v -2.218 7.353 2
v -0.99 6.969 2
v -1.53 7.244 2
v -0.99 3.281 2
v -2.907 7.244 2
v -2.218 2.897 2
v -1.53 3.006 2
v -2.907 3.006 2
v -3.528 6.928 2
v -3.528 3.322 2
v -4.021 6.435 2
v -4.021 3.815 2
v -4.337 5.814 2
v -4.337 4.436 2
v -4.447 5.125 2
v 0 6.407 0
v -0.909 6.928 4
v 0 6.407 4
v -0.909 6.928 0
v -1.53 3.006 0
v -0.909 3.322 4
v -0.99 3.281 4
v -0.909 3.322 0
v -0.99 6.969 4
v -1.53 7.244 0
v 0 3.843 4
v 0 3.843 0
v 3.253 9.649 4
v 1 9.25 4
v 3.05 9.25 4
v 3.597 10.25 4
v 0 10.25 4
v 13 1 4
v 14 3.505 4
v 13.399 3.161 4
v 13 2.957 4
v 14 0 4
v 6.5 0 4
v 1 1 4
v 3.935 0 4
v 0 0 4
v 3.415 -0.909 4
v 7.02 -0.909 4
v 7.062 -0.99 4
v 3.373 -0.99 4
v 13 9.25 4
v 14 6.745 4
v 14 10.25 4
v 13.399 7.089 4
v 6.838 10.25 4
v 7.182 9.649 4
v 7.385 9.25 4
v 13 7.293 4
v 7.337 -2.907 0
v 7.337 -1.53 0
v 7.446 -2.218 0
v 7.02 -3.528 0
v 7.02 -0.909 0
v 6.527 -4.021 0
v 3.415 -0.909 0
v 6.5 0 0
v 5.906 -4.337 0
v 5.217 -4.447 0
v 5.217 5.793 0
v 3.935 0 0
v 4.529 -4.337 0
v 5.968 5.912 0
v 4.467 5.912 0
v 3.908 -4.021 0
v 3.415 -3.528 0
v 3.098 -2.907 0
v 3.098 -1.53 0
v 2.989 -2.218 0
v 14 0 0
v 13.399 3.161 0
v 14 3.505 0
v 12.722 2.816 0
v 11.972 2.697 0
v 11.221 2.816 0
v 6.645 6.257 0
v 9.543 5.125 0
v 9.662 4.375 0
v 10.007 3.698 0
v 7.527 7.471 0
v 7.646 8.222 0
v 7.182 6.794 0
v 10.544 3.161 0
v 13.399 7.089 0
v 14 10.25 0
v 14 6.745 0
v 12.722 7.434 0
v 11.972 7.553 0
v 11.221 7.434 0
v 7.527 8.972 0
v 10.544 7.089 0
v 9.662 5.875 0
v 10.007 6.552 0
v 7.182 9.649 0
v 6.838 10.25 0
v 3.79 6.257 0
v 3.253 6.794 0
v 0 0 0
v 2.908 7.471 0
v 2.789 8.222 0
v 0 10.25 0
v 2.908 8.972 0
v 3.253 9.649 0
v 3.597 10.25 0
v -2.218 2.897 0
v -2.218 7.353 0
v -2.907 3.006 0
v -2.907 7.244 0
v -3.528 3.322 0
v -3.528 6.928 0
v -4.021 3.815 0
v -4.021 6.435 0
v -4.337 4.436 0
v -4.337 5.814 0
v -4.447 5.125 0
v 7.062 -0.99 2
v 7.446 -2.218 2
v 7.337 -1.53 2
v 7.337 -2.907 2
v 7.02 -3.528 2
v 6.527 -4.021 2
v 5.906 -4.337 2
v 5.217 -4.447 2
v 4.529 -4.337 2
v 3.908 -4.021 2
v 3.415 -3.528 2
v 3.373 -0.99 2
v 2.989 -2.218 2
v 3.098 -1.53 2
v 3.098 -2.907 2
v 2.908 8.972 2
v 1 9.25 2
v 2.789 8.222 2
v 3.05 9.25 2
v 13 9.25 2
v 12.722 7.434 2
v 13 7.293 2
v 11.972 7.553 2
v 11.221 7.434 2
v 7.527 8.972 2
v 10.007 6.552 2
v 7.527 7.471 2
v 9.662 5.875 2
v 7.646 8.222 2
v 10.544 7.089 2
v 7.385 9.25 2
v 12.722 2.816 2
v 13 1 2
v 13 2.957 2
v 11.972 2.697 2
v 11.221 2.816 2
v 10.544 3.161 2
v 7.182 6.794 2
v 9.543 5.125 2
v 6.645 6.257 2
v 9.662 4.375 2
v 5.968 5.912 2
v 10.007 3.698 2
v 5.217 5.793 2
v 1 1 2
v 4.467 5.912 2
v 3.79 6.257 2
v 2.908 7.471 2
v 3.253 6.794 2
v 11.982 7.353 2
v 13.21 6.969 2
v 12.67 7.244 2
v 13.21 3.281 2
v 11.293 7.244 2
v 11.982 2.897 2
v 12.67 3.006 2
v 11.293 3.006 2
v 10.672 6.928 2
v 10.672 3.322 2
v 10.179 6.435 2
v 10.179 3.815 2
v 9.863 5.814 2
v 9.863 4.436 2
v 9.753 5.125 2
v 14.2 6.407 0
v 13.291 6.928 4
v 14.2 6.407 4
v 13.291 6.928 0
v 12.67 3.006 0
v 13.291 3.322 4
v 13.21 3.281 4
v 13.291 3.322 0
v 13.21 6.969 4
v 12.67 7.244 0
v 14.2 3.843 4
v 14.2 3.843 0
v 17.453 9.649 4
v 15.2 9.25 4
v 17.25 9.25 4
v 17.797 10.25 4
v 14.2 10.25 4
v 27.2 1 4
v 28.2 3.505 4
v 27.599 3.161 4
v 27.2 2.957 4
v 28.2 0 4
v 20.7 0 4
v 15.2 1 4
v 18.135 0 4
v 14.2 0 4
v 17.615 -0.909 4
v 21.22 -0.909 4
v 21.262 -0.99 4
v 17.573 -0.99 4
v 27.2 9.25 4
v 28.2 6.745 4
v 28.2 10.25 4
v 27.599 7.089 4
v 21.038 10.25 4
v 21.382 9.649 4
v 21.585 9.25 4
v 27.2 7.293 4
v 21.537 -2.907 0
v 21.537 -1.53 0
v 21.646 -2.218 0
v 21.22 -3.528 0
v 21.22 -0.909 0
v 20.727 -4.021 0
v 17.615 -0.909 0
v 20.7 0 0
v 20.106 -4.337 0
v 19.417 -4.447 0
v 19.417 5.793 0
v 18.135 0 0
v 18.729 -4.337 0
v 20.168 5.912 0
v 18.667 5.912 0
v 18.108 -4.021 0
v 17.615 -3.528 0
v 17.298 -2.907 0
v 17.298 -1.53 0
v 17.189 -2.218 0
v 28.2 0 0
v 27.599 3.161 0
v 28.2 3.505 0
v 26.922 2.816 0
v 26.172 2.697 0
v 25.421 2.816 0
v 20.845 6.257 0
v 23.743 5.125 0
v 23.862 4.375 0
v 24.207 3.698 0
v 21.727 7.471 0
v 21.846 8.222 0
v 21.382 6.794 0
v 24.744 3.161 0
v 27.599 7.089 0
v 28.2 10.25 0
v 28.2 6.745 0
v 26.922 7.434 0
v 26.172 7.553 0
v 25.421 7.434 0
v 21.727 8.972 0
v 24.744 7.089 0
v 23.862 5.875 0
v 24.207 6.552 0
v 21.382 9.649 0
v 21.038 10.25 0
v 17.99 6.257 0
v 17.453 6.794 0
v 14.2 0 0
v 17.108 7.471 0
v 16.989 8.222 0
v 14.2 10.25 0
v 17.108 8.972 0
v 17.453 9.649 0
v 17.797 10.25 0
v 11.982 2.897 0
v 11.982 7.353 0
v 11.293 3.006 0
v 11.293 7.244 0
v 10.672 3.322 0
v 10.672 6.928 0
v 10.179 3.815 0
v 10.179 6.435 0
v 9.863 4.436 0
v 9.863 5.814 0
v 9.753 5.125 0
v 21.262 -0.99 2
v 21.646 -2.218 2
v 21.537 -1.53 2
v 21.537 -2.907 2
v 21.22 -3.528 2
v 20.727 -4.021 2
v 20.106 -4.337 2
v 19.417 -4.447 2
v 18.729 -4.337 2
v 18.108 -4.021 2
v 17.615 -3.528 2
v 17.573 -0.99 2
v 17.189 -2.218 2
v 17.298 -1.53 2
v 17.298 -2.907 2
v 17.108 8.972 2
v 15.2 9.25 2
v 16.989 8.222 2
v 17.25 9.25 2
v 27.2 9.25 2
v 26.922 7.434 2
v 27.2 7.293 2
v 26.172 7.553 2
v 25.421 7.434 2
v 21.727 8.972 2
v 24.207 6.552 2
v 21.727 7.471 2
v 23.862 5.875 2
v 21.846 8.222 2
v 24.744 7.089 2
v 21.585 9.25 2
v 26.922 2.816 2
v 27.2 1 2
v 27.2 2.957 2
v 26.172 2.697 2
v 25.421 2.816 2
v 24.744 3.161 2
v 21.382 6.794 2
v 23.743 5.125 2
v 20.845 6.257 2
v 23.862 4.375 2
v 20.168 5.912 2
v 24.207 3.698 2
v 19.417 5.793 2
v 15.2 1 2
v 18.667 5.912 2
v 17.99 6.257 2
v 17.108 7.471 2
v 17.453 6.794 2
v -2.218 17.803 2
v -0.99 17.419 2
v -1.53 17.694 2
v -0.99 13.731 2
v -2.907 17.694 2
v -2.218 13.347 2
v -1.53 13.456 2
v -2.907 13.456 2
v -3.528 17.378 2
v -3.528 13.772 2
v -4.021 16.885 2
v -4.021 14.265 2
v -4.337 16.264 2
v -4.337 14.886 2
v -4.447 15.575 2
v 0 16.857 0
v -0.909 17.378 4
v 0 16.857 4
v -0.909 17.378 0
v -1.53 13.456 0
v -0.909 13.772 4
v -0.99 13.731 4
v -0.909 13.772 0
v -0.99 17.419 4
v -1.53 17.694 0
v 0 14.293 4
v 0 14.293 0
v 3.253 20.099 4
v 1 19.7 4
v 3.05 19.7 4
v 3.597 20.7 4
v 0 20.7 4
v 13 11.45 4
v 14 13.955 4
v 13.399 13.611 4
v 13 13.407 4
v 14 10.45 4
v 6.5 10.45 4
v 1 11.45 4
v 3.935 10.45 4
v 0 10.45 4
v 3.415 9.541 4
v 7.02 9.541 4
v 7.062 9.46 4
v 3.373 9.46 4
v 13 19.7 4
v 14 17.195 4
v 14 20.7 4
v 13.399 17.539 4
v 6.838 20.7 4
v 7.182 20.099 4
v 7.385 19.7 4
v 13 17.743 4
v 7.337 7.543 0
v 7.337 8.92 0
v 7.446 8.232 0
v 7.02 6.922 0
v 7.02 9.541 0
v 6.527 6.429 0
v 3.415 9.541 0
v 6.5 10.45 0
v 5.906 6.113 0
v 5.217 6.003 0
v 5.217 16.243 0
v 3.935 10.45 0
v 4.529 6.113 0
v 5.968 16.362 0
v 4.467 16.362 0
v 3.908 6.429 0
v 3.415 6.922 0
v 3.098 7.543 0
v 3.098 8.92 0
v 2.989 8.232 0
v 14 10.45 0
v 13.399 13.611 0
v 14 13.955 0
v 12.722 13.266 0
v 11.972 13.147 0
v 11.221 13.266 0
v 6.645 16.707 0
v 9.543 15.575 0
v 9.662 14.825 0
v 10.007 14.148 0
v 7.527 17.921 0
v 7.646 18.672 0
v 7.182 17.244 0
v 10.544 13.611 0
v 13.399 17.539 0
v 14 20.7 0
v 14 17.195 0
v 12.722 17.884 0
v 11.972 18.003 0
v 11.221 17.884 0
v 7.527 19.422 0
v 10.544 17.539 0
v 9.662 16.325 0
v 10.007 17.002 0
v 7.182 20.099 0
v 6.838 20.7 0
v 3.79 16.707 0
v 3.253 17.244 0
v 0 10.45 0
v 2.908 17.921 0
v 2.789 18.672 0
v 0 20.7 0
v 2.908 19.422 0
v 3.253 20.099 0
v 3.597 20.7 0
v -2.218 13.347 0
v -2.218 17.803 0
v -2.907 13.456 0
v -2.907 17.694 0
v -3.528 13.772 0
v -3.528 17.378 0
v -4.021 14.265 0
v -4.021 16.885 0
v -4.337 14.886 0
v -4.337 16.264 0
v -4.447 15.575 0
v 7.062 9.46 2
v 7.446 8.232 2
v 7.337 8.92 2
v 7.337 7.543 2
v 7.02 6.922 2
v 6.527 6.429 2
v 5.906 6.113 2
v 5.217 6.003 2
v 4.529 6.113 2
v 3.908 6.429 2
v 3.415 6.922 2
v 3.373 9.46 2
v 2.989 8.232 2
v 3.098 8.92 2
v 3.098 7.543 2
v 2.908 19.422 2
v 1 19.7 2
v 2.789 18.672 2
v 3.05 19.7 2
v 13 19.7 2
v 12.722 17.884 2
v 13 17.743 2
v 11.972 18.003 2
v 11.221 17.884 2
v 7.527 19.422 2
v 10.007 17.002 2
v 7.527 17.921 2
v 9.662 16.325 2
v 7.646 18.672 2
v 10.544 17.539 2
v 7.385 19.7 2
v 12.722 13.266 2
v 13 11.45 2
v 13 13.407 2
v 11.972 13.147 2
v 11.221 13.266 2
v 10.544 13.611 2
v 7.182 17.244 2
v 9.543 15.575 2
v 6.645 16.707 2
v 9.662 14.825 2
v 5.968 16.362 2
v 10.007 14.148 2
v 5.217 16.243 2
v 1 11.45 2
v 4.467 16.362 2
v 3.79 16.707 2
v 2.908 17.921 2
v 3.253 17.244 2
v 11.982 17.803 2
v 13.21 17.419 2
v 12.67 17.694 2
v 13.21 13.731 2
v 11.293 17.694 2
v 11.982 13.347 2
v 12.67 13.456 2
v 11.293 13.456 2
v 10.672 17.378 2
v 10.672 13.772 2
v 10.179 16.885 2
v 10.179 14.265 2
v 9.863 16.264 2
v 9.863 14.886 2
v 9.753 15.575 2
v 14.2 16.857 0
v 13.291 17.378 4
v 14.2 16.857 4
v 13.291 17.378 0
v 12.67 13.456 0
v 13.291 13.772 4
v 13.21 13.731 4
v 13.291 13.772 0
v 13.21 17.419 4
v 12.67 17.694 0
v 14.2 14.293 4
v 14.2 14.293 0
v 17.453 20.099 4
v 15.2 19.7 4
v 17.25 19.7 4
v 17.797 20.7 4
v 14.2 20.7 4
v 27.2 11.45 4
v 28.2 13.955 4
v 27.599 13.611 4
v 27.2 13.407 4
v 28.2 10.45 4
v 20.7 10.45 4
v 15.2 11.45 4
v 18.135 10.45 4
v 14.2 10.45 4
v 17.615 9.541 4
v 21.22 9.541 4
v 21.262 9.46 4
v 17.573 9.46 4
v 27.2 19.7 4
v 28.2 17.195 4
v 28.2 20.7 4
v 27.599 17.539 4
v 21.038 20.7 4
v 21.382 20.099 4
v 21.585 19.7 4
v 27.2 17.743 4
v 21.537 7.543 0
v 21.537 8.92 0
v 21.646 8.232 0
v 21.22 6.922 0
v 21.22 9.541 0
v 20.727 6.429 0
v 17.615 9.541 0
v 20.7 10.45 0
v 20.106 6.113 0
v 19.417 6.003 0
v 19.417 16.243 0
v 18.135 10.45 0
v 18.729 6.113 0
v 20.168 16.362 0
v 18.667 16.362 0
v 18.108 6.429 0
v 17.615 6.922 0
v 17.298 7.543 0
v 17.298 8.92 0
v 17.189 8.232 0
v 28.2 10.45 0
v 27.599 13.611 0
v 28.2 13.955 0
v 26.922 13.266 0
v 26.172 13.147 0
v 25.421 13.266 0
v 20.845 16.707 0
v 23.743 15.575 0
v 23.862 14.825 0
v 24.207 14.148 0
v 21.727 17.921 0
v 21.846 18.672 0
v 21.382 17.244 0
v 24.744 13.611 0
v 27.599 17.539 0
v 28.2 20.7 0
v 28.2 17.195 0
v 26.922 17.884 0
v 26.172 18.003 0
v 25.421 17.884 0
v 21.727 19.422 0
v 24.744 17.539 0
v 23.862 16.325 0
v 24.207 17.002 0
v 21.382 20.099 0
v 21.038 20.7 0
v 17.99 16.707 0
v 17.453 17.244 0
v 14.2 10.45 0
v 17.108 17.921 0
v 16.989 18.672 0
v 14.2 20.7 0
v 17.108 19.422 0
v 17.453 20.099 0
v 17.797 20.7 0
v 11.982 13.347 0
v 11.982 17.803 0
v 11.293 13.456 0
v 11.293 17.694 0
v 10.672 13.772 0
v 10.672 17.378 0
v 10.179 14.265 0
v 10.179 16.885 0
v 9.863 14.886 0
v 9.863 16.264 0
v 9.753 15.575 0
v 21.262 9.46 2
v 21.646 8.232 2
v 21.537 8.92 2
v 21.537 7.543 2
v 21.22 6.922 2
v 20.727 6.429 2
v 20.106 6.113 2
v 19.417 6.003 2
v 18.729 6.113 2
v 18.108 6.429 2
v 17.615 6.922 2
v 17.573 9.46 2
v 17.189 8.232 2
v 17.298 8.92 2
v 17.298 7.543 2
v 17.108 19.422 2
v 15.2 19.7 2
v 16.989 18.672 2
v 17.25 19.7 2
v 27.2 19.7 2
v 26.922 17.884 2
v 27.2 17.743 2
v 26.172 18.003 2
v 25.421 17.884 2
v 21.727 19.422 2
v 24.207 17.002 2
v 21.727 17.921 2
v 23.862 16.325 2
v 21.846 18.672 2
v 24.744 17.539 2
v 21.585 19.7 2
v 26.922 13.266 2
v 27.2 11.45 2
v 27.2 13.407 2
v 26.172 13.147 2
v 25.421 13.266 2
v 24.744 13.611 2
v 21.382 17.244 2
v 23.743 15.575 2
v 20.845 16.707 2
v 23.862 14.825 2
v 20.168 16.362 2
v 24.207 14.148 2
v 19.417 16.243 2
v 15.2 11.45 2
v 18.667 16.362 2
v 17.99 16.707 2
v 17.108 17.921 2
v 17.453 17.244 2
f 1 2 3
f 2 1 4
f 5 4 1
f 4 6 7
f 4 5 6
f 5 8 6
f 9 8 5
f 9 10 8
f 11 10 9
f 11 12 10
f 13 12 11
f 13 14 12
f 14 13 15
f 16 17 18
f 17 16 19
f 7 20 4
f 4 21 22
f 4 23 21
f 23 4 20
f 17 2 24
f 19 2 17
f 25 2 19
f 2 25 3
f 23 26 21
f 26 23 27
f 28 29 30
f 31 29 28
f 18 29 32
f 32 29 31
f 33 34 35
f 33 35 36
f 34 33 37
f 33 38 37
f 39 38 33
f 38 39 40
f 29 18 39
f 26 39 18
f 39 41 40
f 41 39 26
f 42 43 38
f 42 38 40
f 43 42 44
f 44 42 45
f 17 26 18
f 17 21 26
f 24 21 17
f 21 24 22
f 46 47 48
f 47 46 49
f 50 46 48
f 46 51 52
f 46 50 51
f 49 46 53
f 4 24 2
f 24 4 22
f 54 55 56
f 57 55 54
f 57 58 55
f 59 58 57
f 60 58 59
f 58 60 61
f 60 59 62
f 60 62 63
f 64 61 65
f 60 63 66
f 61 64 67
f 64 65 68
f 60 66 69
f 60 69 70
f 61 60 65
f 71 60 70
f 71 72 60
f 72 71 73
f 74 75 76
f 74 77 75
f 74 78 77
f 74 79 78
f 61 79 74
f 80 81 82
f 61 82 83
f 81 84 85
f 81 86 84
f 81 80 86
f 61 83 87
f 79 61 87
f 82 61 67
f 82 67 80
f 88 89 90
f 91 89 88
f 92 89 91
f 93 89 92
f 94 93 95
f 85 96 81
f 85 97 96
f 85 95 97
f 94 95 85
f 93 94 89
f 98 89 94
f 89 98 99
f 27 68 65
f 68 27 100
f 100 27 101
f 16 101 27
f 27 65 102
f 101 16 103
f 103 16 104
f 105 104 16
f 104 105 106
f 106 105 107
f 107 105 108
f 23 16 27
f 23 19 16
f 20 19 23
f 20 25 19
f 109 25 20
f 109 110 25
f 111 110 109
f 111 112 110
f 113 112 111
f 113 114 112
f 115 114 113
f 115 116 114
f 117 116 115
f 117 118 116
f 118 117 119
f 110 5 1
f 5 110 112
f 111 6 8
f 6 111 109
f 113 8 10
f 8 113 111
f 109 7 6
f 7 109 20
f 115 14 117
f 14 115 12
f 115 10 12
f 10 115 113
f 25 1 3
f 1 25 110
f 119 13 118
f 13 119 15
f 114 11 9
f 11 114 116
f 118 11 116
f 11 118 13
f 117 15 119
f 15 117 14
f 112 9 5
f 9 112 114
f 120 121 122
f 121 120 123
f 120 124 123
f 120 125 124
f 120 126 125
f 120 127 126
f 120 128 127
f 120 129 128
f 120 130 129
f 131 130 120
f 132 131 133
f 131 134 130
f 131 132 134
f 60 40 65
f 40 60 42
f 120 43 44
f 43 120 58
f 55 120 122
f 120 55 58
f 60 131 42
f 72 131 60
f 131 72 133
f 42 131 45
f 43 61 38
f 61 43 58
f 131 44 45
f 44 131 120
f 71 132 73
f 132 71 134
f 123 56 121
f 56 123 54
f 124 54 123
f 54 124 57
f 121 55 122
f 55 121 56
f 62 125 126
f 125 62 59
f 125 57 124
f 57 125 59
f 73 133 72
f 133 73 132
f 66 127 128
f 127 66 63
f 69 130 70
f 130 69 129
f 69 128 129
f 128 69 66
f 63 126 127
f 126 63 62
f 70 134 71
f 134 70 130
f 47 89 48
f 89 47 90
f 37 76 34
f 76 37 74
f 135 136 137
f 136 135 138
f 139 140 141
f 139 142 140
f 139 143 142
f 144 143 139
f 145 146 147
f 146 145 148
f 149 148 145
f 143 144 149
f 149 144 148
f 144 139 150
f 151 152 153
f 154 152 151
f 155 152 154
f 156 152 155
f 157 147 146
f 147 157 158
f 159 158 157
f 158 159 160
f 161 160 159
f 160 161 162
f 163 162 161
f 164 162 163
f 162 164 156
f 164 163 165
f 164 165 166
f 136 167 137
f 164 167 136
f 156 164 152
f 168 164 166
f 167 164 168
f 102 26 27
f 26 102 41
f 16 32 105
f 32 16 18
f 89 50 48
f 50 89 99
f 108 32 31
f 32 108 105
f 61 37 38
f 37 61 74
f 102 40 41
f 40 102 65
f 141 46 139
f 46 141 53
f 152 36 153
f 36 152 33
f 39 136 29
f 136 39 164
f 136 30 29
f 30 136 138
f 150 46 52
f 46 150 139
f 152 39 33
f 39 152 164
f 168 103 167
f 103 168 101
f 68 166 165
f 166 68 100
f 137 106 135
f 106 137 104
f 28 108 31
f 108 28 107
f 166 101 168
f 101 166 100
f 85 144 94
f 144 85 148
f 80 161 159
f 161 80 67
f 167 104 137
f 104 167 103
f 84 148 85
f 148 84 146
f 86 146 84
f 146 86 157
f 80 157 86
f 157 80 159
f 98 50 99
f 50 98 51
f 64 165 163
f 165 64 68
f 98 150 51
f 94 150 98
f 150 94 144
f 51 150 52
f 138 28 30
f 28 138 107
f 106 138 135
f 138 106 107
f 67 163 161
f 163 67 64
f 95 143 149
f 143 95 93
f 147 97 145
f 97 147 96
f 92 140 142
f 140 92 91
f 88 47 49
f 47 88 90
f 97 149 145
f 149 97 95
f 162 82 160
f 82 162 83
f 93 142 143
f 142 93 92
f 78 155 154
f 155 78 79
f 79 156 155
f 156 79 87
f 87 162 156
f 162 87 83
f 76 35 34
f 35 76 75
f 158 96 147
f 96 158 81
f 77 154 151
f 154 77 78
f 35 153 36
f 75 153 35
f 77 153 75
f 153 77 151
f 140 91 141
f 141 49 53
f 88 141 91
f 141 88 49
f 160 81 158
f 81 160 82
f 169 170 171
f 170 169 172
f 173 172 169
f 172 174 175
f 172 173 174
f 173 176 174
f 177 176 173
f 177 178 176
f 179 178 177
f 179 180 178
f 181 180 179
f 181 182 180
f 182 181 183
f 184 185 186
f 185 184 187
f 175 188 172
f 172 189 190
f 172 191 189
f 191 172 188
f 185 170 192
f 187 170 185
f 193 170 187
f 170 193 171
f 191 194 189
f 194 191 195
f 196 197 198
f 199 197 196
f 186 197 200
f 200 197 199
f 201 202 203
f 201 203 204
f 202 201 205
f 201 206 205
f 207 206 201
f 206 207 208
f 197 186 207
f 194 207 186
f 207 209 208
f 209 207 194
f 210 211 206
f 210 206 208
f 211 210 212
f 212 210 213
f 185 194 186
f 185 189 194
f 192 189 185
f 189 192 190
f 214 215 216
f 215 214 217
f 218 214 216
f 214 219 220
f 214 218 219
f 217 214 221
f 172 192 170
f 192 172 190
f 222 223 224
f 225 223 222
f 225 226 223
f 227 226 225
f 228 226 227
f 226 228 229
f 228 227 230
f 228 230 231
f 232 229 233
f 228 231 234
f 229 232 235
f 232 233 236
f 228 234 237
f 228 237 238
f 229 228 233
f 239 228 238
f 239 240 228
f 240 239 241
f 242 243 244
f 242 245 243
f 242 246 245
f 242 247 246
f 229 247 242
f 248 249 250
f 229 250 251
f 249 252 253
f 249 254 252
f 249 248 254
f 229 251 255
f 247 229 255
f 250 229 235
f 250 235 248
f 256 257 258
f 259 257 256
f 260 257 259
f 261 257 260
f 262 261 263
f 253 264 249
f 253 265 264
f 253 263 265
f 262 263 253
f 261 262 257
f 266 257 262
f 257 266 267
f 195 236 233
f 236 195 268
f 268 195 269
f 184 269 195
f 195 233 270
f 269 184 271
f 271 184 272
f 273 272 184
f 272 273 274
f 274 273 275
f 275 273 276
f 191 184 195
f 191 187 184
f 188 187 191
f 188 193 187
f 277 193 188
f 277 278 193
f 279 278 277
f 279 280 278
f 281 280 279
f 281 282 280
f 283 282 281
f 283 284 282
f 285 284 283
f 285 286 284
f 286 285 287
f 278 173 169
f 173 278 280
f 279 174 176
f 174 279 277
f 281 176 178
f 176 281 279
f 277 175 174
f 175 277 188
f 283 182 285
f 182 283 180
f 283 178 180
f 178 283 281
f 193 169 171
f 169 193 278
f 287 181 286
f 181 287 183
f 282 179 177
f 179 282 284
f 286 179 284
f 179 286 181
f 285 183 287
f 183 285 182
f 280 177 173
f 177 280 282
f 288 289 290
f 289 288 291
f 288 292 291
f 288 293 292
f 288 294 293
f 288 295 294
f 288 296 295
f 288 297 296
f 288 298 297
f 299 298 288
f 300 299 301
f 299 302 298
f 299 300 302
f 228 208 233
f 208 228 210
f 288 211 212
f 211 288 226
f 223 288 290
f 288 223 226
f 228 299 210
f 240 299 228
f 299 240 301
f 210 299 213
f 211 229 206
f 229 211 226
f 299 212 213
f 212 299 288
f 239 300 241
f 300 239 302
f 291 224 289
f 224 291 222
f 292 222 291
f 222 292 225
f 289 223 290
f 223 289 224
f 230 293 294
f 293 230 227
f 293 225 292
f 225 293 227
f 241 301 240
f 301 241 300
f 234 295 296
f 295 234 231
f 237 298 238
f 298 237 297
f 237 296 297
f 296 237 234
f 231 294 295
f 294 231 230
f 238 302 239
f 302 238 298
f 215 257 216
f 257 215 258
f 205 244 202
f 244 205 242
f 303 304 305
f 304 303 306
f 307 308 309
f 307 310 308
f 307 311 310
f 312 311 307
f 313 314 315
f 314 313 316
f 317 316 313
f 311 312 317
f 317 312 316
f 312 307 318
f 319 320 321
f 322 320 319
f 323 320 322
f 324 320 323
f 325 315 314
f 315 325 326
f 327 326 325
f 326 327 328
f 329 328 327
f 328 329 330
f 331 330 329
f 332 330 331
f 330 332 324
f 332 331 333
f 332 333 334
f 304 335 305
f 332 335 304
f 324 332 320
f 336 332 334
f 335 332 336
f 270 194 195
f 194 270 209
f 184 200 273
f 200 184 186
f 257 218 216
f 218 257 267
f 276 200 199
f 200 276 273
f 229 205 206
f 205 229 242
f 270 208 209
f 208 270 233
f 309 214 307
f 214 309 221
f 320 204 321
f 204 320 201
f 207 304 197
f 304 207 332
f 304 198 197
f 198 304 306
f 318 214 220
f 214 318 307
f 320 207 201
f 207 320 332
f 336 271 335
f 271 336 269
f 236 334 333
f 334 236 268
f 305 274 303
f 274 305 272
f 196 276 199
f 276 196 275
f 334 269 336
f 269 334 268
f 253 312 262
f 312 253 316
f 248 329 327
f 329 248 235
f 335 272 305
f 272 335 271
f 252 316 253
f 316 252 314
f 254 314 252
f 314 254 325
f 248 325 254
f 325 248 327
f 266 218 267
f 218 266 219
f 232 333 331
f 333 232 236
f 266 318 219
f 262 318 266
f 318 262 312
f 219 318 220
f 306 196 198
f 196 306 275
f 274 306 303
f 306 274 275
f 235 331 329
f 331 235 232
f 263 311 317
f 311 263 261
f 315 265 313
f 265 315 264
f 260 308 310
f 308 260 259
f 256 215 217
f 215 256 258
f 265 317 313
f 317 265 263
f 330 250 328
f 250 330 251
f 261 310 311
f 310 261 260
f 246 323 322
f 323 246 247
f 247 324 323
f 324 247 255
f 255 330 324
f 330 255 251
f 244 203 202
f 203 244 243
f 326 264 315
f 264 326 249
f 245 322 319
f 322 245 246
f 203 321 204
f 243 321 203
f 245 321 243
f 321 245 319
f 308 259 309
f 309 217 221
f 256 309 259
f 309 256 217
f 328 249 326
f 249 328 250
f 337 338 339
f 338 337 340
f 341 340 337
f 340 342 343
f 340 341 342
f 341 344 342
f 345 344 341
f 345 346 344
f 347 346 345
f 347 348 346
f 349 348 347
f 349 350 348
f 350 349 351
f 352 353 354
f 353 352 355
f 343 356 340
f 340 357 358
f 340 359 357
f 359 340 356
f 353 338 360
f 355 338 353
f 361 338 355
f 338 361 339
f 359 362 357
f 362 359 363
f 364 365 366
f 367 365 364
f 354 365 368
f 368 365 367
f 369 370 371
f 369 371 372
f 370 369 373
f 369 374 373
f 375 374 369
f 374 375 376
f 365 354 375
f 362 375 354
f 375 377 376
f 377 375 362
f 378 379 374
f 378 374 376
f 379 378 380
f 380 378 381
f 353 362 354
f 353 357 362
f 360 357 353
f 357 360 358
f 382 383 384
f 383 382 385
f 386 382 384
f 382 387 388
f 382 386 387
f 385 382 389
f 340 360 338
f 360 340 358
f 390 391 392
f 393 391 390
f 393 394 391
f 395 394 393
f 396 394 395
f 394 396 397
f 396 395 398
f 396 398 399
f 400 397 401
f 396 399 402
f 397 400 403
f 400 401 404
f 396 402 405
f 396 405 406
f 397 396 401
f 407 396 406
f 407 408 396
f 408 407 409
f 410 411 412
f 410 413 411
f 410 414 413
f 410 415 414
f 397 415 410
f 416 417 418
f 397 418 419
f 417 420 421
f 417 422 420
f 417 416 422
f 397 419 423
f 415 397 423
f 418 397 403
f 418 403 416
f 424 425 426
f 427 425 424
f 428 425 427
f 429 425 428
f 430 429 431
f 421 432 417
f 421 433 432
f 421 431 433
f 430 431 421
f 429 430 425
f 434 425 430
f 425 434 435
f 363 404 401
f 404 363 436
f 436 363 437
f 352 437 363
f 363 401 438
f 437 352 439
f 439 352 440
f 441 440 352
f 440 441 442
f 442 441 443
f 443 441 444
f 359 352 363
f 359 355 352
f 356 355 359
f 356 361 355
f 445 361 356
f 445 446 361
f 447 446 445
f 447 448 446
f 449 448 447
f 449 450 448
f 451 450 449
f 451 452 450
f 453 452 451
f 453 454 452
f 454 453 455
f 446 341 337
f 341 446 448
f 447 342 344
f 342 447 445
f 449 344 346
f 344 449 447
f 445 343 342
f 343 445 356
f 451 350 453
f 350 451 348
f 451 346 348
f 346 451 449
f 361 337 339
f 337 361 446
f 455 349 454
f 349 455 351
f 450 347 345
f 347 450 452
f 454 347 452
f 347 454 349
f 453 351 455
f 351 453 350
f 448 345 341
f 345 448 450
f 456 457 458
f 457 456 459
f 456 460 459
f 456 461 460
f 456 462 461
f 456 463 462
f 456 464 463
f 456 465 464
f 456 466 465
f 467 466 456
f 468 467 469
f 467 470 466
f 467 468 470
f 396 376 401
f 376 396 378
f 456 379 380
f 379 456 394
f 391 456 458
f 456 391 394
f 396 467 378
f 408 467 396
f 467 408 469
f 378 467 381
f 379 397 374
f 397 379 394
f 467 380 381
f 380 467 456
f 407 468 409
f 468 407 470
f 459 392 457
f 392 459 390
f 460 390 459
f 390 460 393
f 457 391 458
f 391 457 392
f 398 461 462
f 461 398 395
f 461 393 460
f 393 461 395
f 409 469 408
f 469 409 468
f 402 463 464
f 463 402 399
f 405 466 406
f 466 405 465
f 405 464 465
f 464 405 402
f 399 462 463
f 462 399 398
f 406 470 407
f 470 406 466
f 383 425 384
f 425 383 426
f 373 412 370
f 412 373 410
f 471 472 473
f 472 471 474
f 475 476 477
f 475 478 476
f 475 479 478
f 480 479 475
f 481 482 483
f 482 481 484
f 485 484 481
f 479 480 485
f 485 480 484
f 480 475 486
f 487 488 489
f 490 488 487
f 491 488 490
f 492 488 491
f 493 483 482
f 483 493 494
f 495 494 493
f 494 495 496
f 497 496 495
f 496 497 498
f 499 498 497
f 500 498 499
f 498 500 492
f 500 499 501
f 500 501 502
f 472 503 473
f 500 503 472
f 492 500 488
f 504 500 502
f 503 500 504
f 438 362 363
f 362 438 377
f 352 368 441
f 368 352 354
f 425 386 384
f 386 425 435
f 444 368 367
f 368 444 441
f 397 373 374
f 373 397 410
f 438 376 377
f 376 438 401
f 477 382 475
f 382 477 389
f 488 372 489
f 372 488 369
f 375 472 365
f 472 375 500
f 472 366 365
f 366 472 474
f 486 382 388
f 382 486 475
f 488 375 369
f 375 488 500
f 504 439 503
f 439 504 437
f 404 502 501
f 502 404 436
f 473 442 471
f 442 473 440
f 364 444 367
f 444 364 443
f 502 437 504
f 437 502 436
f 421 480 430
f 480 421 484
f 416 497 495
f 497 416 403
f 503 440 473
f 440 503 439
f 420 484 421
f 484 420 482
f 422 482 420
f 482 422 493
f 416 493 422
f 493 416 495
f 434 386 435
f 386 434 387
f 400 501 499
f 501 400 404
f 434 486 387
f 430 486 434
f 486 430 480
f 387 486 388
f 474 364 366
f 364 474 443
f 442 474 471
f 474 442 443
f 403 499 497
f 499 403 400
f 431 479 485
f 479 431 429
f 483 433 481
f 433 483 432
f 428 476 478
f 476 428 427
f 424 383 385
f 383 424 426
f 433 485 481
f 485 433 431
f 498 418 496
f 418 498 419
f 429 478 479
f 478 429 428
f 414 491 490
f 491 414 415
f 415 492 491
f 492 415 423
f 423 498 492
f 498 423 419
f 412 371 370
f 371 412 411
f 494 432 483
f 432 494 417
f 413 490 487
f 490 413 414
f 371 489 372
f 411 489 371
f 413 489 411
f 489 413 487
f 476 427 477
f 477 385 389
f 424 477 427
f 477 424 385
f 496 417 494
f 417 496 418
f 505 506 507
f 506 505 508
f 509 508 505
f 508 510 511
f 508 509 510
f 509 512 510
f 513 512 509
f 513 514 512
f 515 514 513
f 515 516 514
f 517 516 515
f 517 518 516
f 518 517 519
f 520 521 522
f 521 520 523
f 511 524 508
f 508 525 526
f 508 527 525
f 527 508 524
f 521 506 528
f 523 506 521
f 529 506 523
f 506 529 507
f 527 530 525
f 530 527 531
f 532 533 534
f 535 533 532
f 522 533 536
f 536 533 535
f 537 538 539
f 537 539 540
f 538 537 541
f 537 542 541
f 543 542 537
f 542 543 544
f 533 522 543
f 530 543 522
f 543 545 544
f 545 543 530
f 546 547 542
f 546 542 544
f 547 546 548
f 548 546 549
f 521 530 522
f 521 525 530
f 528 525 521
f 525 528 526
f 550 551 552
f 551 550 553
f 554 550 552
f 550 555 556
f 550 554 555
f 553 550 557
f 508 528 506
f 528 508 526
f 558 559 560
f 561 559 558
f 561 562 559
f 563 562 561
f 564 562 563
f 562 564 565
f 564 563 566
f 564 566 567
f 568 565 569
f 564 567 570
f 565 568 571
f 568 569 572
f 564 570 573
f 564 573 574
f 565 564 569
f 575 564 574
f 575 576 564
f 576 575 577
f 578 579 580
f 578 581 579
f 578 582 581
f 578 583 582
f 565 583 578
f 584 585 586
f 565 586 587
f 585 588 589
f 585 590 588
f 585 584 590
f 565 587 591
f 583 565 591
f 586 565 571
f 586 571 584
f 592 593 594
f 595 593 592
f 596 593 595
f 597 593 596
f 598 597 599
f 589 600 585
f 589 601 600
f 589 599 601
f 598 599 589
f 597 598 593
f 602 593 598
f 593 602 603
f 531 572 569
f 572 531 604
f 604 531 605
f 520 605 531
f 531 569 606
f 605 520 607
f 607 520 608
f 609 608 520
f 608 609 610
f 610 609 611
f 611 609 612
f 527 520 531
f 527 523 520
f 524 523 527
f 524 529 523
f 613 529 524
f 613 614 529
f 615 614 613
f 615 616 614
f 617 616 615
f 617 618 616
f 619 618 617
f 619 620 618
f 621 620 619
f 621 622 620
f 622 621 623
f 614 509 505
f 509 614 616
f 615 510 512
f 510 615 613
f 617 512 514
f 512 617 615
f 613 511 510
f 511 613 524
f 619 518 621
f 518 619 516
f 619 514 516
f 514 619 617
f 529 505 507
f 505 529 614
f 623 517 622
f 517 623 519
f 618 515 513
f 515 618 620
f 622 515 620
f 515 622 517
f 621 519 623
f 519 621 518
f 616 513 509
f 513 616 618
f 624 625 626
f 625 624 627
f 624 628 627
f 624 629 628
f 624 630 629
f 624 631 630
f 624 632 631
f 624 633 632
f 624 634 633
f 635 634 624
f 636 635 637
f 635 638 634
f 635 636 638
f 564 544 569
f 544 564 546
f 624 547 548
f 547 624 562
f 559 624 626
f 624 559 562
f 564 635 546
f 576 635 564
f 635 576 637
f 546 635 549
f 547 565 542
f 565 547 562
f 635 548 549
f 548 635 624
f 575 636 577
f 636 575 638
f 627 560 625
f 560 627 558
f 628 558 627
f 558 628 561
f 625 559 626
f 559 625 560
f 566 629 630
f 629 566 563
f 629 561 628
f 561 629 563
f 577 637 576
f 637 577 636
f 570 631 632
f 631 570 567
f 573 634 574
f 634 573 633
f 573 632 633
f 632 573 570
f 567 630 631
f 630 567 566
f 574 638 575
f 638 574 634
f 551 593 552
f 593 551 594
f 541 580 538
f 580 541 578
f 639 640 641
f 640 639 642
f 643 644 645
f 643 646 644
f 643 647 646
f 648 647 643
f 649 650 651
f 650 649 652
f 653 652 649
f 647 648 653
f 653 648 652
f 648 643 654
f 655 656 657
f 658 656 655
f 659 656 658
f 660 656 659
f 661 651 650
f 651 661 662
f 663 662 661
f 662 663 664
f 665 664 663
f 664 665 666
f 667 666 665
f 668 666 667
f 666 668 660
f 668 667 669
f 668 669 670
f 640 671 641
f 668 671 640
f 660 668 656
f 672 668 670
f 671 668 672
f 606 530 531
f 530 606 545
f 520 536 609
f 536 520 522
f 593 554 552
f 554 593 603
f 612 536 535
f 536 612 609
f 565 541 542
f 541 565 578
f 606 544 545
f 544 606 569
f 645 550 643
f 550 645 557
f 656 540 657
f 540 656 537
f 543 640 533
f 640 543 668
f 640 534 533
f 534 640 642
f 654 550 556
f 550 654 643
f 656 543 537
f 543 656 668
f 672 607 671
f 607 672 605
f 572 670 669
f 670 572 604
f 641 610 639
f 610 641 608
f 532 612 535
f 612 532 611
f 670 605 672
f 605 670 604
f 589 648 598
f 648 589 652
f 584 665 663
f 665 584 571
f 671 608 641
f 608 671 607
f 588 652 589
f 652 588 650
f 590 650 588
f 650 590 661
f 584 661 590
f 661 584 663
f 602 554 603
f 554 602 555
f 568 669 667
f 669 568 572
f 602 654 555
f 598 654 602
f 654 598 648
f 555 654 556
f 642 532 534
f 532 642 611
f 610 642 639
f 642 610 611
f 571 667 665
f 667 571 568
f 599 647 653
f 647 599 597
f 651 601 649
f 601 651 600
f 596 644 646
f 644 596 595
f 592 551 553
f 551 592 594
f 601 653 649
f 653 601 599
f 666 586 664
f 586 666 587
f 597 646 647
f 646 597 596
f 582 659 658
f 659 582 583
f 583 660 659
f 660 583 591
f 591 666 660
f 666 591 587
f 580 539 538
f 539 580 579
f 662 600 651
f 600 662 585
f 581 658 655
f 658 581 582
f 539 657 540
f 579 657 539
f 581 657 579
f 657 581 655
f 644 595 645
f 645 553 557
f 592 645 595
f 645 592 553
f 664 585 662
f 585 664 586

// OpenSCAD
// file: offset.scad
//  openSCAD polyline offset routine retrieved from newgroup
//  https://forum.openscad.org/Polygon-Offset-Function-td17186.html

// given a polygon, offset each vertex using the corner offset method above
// note: this can produce self-intersections depending on the 'curvature' and offset
function offset_pts(pts, dist) = 
  _offset_poly(_iterative_remove_edges(pts, dist), dist);
  
  
module test(){
  pts1 =  [[35, -8], [35, 7], [20, 12], [-10, 60], [-25, 65], [-40, 60], [-30, 50], [-21, 18], [-21, -18], [-30, -50], [-40, -60], [-25, -65], [-10, -60], [20, -13]];
  pts2 = offset_pts(pts1, -0.5);
  difference(){
      translate([0,0,1]) color("red") polygon(pts1);
      polygon(pts2);
  }
  polygon(pts2);
}

test();
  
  
 
//  Helper functions

// given two points, a, b, find equation for line that is parallel to line 
// segment but offset to the right by offset dist
// equation is of the form c*x+d*y=e
// represented as array [ c, d, e ]
function _seg2eq(pa, pb, dist) = 
  let (ab = [pb[0]-pa[0], pb[1]-pa[1]])
  let (abl_un = [-ab[1], ab[0]])
  let (abl_len = sqrt(abl_un[0]*abl_un[0] + abl_un[1]*abl_un[1]))
  let (abl = [ abl_un[0]/abl_len, abl_un[1]/abl_len ])
  [ abl[0], abl[1], abl[0]*pa[0] + abl[1]*pa[1] - dist ];

// given two equations for lines, solve two equations to find intersection
function _solve2eq(eq1, eq2) = 
  let (a=eq1[0], b=eq1[1], c = eq1[2], d=eq2[0], e=eq2[1], f=eq2[2])
  let (det=a*e-b*d)
  [ (e*c-b*f)/det, (-d*c+a*f)/det ];

// given a corner as two line segments, AB and BC, find the new corner B' that results 
// when both line segments are offet.  Works by generating two equations and then solving
function _offset_corner(pa, pb, pc, dist) = 
  _solve2eq(_seg2eq(pa, pb, dist), _seg2eq(pb, pc, dist));

//echo(_ensurePathNotClosed([[1,2],[2,3],[3,4],[1,2]]));

// given a polygon, offset each vertex using the corner offset method above
// note: this can produce self-intersections depending on the 'curvature' and offset
function _offset_poly(p, dist) = 
  [ 
  for (i=[0:len(p)-1]) 
    i == 0 ? _offset_corner(p[len(p)-1], p[i], p[i+1], dist) :
    i == len(p)-1 ? _offset_corner(p[i-1], p[i], p[0], dist) :
    _offset_corner(p[i-1], p[i], p[i+1], dist)
  ];

// each segment of a polygon will 'vanish' at some offset value (unless adjacent 
// segments are parallel).  Compute the offset at which each segment vanishes 
// (produces 'nan' or plus or minus infinity when adjacent segments parallel)
function _offset_limit(p) = 
  let (N = len(p))
  let (offp = _offset_poly(p, 1))  // each vertex adjusted for unit of offset
  [ for (i=[0:N-1])  // for each segment
    // equations for segment for each vertex (angle bisector)
    let (eqv1 = _seg2eq(p[i], offp[i], 0),  eqv2 = _seg2eq(p[(i+1)%N], offp[(i+1)%N], 0))
    let (singv = _solve2eq(eqv1, eqv2))  // 'singular' vertex where edge vanishes
    let (offv = offp[i]-p[i])  // vertex shifts this much per unit of offset
    let (targetv = singv - p[i])  // what offset produces this coordinate?
    // essentially quotient of lengths, but need to take into account negative offsets
    // use dot product to find cosine of angle, should be 1 or -1
    let (sgn = (offv[0]*targetv[0] + offv[1]*targetv[1])/(norm(offv)*norm(targetv)))
    sgn * norm(targetv)/norm(offv)
  ]
;
  
// transform polygon into sequence of edges as equations, skipping flipped edges
// and then transform back into vertices by solving adjacent equations
function _remove_edges(p, dist) = 
  let (N = len(p), offlim = _offset_limit(p))
  let (eqlist = [ for (i=[0:N-1])
    if (!(dist/offlim[i] > 1))
      _seg2eq(p[i], p[(i+1)%N], 0)
    ])
  let (N2 = len(eqlist))
  [ for (i=[0:N2-1])
    _solve2eq(eqlist[(i+N2-1)%N2], eqlist[i]) ];

function _iterative_remove_edges(p, dist) =
  let (cleaned = _remove_edges(p, dist))
  len(cleaned) == len(p) ? p : _iterative_remove_edges(cleaned, dist);

// given a polygon, offset each vertex using the corner offset method above
// note: this can produce self-intersections depending on the 'curvature' and offset
function offset_poly(pts, dist) = 
  _offset_poly(_iterative_remove_edges(pts, dist), dist);


  
  
  
// file: puzzle-connector.scad
use <offset.scad>

module puzzle_connector_pear(diameter, height, inset=0, skirt=[0, 0]) {
	module connector(diameter, height, inset) {
		linear_extrude(height=height)  {
			difference() {
				hull() {
					circle(d=diameter/2-inset*2, $fn=20);
					translate([diameter/2,0,0])
						circle(d=diameter-inset*2, $fn=20);
				};
				translate([-diameter/2,0,0])
					square(size=[diameter,diameter], center=true);
			}
		}
	}
	if ((skirt[0] > 0) && (skirt[1] > 0)) {
		difference() {
			translate([0, 0, height])
				connector(diameter, skirt[0], inset);
			translate([skirt[1], -(diameter-inset*2)/2, height])
				cube([diameter-inset*2, diameter-inset*2, skirt[0]]);
		}
	}
	connector(diameter, height, inset);
}

module puzzle_connector_round(diameter, base, height, inset=0, skirt=[0, 0]) {
	module connector(diameter, base, height, inset) {
		translate([0, -base/2, 0])
			union() {
				linear_extrude(height=height) {
					translate([(diameter + base/4)/2, base/2, 0])
						circle(d = diameter-inset*2, $fn=20);
					translate([0, inset, 0])
						square([base, base - inset*2]);
				}
			}
	}
	if ((skirt[0] > 0) && (skirt[1] > 0)) {
		difference() {
			translate([0, 0, height])
				connector(diameter, base, skirt[0], inset);
			translate([skirt[1], -(diameter-inset*2)/2, height])
				cube([diameter-inset*2, diameter-inset*2, skirt[0]]);
		}
	}
	connector(diameter, base, height, inset);
}

difference() {
	puzzle_connector_round(5, 2.5, 2, -0.3, [1, 1]);
	puzzle_connector_round(5, 2.5, 2, 0, [1, 1]);
}

translate([0, 7, 0]) {
	difference() {
		puzzle_connector_pear(5, 2, -0.3, [1, 1]);
		puzzle_connector_pear(5, 2, 0, [1, 1]);
	}
}
// main file
use <puzzle-connector.scad>

module corner_slope(l, h) {
	cube([l, h, h/2]); 
	cube([l, h/2, h]); 

	translate([0,l,0]) 
		rotate([0, 0, -90]) {
			cube([l, h, h/2]); 
			cube([l, h/2, h]); 
		}
}

module corner(l, h) {
	cube([l, h, h]); 

	translate([0,l,0]) 
		rotate([0, 0, -90]) {
			cube([l, h, h]); 
		}
}

module puzzle_base(l, w, h, c) {

	c_offset = (l-c*1.8)/2;
	c_width = (w - c)/2;
	c_scale = (c+0.3)/c;

	difference() {

		union() {
			cube([l, w, h], center=false);

			translate([0.01, w/2, 0])
				rotate([0, 0, 180])
				puzzle_connector_pear(c, h, 0, [h, h/2]);

			translate([c/2+c_offset, 0.01, 0])
				rotate([0, 0, -90])
				puzzle_connector_pear(c, h, 0, [h, h/2]);

			translate([0, 0, h]) {
				difference() {
					cube([l, w, h], center=false);
					translate([h/2, h/2, 0])
						cube([l-h, w-h, h], center=false);
				}
			}
		}

		translate([c/2+c_offset, w+0.2, 0])
			rotate([0, 0, -90])
		    puzzle_connector_pear(c, h*2, -0.2);

		translate([l+0.2, w/2, 0])
			rotate([0, 0, 180])
			puzzle_connector_pear(c, h*2, -0.2);
	}
}

spacing = 2.5;
distance = 3.75 + spacing;     
plate_height = 10;
plate_thickness = 2;

translate([0, 0, 0])
puzzle_base(
	plate_height + 2*plate_thickness,
	distance + 2*plate_thickness,
	plate_thickness,
	(distance + 2*plate_thickness)/2.3);

translate([plate_height+2*plate_thickness+0.2, 0, 0])
puzzle_base(
	plate_height + 2*plate_thickness,
	distance + 2*plate_thickness,
    plate_thickness,
	(distance + 2*plate_thickness)/2.3);

translate([0, distance + 2*plate_thickness+0.2, 0])
puzzle_base(
	plate_height + 2*plate_thickness,
	distance + 2*plate_thickness,
	plate_thickness,
	(distance + 2*plate_thickness)/2.3);

translate([plate_height+2*plate_thickness+0.2, distance + 2*plate_thickness+0.2, 0])
puzzle_base(
	plate_height + 2*plate_thickness,
	distance + 2*plate_thickness,
    plate_thickness,
	(distance + 2*plate_thickness)/2.3);

//use <braille-letter.scad>
//translate([plate_thickness, plate_thickness, plate_thickness])
//	* braille_letter("A");
